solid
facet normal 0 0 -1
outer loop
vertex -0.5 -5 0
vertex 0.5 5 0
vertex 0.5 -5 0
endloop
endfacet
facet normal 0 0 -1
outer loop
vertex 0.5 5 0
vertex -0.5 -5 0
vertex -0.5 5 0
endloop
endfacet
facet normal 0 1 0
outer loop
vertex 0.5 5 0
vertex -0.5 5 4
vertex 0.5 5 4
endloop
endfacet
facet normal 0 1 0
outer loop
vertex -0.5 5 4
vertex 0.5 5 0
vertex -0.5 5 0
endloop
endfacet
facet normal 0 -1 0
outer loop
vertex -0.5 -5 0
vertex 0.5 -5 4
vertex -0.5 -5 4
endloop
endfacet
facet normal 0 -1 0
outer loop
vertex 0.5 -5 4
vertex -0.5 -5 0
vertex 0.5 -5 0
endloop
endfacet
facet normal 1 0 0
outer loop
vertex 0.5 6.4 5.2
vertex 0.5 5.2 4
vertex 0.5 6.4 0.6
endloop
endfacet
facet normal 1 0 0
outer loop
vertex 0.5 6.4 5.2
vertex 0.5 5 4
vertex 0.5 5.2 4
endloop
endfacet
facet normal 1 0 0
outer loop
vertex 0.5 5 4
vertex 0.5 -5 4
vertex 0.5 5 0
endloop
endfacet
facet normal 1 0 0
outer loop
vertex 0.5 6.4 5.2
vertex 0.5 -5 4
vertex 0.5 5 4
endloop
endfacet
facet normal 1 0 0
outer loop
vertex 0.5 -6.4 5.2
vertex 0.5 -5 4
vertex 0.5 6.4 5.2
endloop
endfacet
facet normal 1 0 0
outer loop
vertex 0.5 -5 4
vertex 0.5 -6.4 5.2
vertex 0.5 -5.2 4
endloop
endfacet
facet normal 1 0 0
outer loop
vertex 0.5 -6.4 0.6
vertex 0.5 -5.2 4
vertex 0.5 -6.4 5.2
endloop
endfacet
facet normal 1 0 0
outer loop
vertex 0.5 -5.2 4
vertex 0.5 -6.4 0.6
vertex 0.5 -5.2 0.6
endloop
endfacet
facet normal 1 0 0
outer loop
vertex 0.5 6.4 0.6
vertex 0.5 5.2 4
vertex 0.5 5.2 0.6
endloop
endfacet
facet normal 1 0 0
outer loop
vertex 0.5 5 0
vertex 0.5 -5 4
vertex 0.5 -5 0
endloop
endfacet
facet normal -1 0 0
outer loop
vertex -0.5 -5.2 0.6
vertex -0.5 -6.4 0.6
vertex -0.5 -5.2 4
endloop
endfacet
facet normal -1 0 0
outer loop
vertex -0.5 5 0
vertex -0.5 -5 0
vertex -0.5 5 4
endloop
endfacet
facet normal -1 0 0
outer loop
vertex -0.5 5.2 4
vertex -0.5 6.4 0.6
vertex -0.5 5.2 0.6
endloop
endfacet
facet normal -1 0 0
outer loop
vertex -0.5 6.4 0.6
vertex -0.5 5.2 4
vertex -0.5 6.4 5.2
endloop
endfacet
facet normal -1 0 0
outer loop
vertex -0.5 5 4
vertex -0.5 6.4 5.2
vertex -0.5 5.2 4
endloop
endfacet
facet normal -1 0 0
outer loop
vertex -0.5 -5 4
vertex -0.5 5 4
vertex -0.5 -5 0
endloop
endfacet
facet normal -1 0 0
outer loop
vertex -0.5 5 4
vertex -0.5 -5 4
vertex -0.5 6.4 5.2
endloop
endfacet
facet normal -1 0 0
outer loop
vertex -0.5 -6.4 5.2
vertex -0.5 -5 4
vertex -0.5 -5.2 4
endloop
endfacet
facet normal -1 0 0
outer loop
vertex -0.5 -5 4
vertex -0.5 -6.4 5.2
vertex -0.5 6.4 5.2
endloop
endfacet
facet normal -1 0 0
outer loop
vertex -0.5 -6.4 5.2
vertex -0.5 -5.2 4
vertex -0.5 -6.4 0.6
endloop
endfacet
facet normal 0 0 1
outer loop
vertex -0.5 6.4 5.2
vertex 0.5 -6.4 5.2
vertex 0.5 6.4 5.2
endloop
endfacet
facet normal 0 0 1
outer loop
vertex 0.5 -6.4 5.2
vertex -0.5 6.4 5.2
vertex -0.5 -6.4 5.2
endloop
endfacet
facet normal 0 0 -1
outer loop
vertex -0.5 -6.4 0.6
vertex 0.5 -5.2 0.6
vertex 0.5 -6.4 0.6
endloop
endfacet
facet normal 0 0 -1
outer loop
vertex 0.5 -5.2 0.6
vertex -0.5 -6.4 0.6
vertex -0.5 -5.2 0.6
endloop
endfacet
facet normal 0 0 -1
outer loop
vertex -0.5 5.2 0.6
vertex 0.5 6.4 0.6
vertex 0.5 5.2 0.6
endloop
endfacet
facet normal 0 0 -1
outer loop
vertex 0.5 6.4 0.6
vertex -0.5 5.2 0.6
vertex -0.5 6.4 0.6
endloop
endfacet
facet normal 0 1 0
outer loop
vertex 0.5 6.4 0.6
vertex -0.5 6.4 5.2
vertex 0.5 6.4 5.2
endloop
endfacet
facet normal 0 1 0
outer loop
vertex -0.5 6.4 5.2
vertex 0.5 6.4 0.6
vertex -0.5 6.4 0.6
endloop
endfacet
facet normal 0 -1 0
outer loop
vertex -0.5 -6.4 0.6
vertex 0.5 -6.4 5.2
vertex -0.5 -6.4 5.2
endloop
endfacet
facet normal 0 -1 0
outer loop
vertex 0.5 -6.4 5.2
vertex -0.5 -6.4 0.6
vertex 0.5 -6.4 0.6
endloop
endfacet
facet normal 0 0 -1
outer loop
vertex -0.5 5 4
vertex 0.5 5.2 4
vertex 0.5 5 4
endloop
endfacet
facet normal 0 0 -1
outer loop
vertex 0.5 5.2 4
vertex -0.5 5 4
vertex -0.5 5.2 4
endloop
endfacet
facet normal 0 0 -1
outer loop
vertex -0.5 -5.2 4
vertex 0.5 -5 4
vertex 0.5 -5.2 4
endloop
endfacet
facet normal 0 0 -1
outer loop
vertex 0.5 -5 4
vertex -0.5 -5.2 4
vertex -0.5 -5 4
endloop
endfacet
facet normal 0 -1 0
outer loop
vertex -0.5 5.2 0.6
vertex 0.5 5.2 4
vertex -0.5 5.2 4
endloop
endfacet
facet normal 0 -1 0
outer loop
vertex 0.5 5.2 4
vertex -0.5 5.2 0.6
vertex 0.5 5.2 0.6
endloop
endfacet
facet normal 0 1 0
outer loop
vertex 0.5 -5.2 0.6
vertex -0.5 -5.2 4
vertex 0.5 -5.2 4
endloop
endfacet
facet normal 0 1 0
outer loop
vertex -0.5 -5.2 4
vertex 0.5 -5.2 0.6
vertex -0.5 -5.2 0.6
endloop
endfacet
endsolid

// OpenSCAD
// file: ../lib/at01_inverted_core_snap.scad
// File: at01_inverted_core_snap.scad
// AT-01 — experiment-owned inverted fixed-core / removable-shell snap.
//
// This geometry does not copy the QuackWorks/OpenGrid snap. It keeps only the
// high-level design lessons: compact fixed side, removable compliant side,
// explicit locating/retention roles, and a Lite-like 4.0 / 3.4 mm Z baseline.

// Fixed-side baseline.
AT01_CORE_SIZE = 10.0;
AT01_CORE_HEIGHT = 4.0;
AT01_ROOT_SHOULDER = 0.6;
AT01_ENGAGEMENT_HEIGHT = 3.4;

// Removable shell.
AT01_CLEARANCE = 0.20;              // per side on nominal 10 x 10 core
AT01_SHELL_WALL = 1.20;
AT01_SHELL_TOP = 1.20;
AT01_SHELL_INNER = AT01_CORE_SIZE + 2 * AT01_CLEARANCE;
AT01_SHELL_OUTER = AT01_SHELL_INNER + 2 * AT01_SHELL_WALL;
AT01_SHELL_HEIGHT = AT01_ENGAGEMENT_HEIGHT + AT01_SHELL_TOP;

// Two-sided retention on +/-X.
AT01_RIB_PROTRUSION = 0.35;
AT01_RIB_WIDTH = 4.0;
AT01_RIB_Z_BOTTOM = 0.75;
AT01_RIB_Z_LOWER_MAX = 0.95;
AT01_RIB_Z_UPPER_MAX = 1.15;
AT01_RIB_Z_TOP = 1.60;

// Receiving window in each compliant shell tongue.
// Values are shell-local; assembled shell starts at Z=AT01_ROOT_SHOULDER.
AT01_WINDOW_WIDTH = 4.8;
AT01_WINDOW_Z_MIN = 0.05;
AT01_WINDOW_Z_MAX = 1.10;

// Two relief slots isolate the center tongue on each +/-X wall.
AT01_FLEX_SLOT_Y = 3.0;
AT01_FLEX_SLOT_WIDTH = 0.8;

// Evidence helpers.
AT01_EXPLODED_Z = 8.0;
AT01_PROFILE_SLICE = 1.0;

assert(
    abs(AT01_ROOT_SHOULDER + AT01_ENGAGEMENT_HEIGHT - AT01_CORE_HEIGHT) < 0.0001,
    "AT-01 Lite baseline must satisfy shoulder + engagement = 4.0 mm."
);
assert(
    abs(AT01_SHELL_INNER - (AT01_CORE_SIZE + 2 * AT01_CLEARANCE)) < 0.0001,
    "AT-01 shell inner size must preserve the stated side clearance."
);

module _at01_positive_x_retention_rib() {
    // Polygon is defined in X/Z and extruded along Y.
    rotate([90, 0, 0])
        linear_extrude(height = AT01_RIB_WIDTH, center = true, convexity = 10)
            polygon(points = [
                [AT01_CORE_SIZE / 2, AT01_RIB_Z_BOTTOM],
                [AT01_CORE_SIZE / 2 + AT01_RIB_PROTRUSION, AT01_RIB_Z_LOWER_MAX],
                [AT01_CORE_SIZE / 2 + AT01_RIB_PROTRUSION, AT01_RIB_Z_UPPER_MAX],
                [AT01_CORE_SIZE / 2, AT01_RIB_Z_TOP]
            ]);
}

module at01_fixed_core() {
    union() {
        translate([-AT01_CORE_SIZE / 2, -AT01_CORE_SIZE / 2, 0])
            cube([AT01_CORE_SIZE, AT01_CORE_SIZE, AT01_CORE_HEIGHT]);

        _at01_positive_x_retention_rib();

        mirror([1, 0, 0])
            _at01_positive_x_retention_rib();
    }
}

module _at01_shell_outer() {
    translate([-AT01_SHELL_OUTER / 2, -AT01_SHELL_OUTER / 2, 0])
        cube([AT01_SHELL_OUTER, AT01_SHELL_OUTER, AT01_SHELL_HEIGHT]);
}

module _at01_shell_cavity() {
    // Ends exactly at the underside of the top plate.
    translate([-AT01_SHELL_INNER / 2, -AT01_SHELL_INNER / 2, -0.05])
        cube([AT01_SHELL_INNER, AT01_SHELL_INNER, AT01_ENGAGEMENT_HEIGHT + 0.05]);
}

module _at01_retention_window(x_sign = 1) {
    wall_center = (AT01_SHELL_INNER / 2 + AT01_SHELL_OUTER / 2) / 2;
    translate([
        x_sign * wall_center,
        0,
        (AT01_WINDOW_Z_MIN + AT01_WINDOW_Z_MAX) / 2
    ])
        cube([
            AT01_SHELL_WALL + 0.4,
            AT01_WINDOW_WIDTH,
            AT01_WINDOW_Z_MAX - AT01_WINDOW_Z_MIN
        ], center = true);
}

module _at01_flex_slot(x_sign = 1, y_sign = 1) {
    wall_center = (AT01_SHELL_INNER / 2 + AT01_SHELL_OUTER / 2) / 2;
    translate([
        x_sign * wall_center,
        y_sign * AT01_FLEX_SLOT_Y,
        AT01_ENGAGEMENT_HEIGHT / 2
    ])
        cube([
            AT01_SHELL_WALL + 0.4,
            AT01_FLEX_SLOT_WIDTH,
            AT01_ENGAGEMENT_HEIGHT + 0.10
        ], center = true);
}

module at01_removable_shell() {
    difference() {
        _at01_shell_outer();
        _at01_shell_cavity();

        for (x_sign = [-1, 1]) {
            _at01_retention_window(x_sign);

            for (y_sign = [-1, 1])
                _at01_flex_slot(x_sign, y_sign);
        }
    }
}

module at01_assembled(shell_alpha = 0.55) {
    color([0.68, 0.70, 0.74])
        at01_fixed_core();

    translate([0, 0, AT01_ROOT_SHOULDER])
        color([0.92, 0.30, 0.12, shell_alpha])
            at01_removable_shell();
}

module at01_exploded() {
    color([0.68, 0.70, 0.74])
        at01_fixed_core();

    translate([0, 0, AT01_ROOT_SHOULDER + AT01_EXPLODED_Z])
        color([0.92, 0.30, 0.12])
            at01_removable_shell();
}

module _at01_retention_slice_volume() {
    translate([-20, -AT01_PROFILE_SLICE / 2, -1])
        cube([40, AT01_PROFILE_SLICE, 12]);
}

module _at01_locating_slice_volume() {
    translate([-AT01_PROFILE_SLICE / 2, -20, -1])
        cube([AT01_PROFILE_SLICE, 40, 12]);
}

module at01_fixed_retention_profile() {
    intersection() {
        at01_fixed_core();
        _at01_retention_slice_volume();
    }
}

module at01_shell_retention_profile() {
    intersection() {
        at01_removable_shell();
        translate([0, 0, -AT01_ROOT_SHOULDER])
            _at01_retention_slice_volume();
    }
}

module at01_fixed_locating_profile() {
    intersection() {
        at01_fixed_core();
        _at01_locating_slice_volume();
    }
}

module at01_shell_locating_profile() {
    intersection() {
        at01_removable_shell();
        translate([0, 0, -AT01_ROOT_SHOULDER])
            _at01_locating_slice_volume();
    }
}

module at01_retention_section() {
    color([0.68, 0.70, 0.74])
        at01_fixed_retention_profile();

    translate([0, 0, AT01_ROOT_SHOULDER])
        color([0.92, 0.30, 0.12])
            at01_shell_retention_profile();
}

module at01_locating_section() {
    color([0.68, 0.70, 0.74])
        at01_fixed_locating_profile();

    translate([0, 0, AT01_ROOT_SHOULDER])
        color([0.92, 0.30, 0.12])
            at01_shell_locating_profile();
}
// main file
include <../lib/at01_inverted_core_snap.scad>
$vpt=[0,0,2.6]; $vpr=[90,0,90]; $vpd=44;
at01_locating_section();
